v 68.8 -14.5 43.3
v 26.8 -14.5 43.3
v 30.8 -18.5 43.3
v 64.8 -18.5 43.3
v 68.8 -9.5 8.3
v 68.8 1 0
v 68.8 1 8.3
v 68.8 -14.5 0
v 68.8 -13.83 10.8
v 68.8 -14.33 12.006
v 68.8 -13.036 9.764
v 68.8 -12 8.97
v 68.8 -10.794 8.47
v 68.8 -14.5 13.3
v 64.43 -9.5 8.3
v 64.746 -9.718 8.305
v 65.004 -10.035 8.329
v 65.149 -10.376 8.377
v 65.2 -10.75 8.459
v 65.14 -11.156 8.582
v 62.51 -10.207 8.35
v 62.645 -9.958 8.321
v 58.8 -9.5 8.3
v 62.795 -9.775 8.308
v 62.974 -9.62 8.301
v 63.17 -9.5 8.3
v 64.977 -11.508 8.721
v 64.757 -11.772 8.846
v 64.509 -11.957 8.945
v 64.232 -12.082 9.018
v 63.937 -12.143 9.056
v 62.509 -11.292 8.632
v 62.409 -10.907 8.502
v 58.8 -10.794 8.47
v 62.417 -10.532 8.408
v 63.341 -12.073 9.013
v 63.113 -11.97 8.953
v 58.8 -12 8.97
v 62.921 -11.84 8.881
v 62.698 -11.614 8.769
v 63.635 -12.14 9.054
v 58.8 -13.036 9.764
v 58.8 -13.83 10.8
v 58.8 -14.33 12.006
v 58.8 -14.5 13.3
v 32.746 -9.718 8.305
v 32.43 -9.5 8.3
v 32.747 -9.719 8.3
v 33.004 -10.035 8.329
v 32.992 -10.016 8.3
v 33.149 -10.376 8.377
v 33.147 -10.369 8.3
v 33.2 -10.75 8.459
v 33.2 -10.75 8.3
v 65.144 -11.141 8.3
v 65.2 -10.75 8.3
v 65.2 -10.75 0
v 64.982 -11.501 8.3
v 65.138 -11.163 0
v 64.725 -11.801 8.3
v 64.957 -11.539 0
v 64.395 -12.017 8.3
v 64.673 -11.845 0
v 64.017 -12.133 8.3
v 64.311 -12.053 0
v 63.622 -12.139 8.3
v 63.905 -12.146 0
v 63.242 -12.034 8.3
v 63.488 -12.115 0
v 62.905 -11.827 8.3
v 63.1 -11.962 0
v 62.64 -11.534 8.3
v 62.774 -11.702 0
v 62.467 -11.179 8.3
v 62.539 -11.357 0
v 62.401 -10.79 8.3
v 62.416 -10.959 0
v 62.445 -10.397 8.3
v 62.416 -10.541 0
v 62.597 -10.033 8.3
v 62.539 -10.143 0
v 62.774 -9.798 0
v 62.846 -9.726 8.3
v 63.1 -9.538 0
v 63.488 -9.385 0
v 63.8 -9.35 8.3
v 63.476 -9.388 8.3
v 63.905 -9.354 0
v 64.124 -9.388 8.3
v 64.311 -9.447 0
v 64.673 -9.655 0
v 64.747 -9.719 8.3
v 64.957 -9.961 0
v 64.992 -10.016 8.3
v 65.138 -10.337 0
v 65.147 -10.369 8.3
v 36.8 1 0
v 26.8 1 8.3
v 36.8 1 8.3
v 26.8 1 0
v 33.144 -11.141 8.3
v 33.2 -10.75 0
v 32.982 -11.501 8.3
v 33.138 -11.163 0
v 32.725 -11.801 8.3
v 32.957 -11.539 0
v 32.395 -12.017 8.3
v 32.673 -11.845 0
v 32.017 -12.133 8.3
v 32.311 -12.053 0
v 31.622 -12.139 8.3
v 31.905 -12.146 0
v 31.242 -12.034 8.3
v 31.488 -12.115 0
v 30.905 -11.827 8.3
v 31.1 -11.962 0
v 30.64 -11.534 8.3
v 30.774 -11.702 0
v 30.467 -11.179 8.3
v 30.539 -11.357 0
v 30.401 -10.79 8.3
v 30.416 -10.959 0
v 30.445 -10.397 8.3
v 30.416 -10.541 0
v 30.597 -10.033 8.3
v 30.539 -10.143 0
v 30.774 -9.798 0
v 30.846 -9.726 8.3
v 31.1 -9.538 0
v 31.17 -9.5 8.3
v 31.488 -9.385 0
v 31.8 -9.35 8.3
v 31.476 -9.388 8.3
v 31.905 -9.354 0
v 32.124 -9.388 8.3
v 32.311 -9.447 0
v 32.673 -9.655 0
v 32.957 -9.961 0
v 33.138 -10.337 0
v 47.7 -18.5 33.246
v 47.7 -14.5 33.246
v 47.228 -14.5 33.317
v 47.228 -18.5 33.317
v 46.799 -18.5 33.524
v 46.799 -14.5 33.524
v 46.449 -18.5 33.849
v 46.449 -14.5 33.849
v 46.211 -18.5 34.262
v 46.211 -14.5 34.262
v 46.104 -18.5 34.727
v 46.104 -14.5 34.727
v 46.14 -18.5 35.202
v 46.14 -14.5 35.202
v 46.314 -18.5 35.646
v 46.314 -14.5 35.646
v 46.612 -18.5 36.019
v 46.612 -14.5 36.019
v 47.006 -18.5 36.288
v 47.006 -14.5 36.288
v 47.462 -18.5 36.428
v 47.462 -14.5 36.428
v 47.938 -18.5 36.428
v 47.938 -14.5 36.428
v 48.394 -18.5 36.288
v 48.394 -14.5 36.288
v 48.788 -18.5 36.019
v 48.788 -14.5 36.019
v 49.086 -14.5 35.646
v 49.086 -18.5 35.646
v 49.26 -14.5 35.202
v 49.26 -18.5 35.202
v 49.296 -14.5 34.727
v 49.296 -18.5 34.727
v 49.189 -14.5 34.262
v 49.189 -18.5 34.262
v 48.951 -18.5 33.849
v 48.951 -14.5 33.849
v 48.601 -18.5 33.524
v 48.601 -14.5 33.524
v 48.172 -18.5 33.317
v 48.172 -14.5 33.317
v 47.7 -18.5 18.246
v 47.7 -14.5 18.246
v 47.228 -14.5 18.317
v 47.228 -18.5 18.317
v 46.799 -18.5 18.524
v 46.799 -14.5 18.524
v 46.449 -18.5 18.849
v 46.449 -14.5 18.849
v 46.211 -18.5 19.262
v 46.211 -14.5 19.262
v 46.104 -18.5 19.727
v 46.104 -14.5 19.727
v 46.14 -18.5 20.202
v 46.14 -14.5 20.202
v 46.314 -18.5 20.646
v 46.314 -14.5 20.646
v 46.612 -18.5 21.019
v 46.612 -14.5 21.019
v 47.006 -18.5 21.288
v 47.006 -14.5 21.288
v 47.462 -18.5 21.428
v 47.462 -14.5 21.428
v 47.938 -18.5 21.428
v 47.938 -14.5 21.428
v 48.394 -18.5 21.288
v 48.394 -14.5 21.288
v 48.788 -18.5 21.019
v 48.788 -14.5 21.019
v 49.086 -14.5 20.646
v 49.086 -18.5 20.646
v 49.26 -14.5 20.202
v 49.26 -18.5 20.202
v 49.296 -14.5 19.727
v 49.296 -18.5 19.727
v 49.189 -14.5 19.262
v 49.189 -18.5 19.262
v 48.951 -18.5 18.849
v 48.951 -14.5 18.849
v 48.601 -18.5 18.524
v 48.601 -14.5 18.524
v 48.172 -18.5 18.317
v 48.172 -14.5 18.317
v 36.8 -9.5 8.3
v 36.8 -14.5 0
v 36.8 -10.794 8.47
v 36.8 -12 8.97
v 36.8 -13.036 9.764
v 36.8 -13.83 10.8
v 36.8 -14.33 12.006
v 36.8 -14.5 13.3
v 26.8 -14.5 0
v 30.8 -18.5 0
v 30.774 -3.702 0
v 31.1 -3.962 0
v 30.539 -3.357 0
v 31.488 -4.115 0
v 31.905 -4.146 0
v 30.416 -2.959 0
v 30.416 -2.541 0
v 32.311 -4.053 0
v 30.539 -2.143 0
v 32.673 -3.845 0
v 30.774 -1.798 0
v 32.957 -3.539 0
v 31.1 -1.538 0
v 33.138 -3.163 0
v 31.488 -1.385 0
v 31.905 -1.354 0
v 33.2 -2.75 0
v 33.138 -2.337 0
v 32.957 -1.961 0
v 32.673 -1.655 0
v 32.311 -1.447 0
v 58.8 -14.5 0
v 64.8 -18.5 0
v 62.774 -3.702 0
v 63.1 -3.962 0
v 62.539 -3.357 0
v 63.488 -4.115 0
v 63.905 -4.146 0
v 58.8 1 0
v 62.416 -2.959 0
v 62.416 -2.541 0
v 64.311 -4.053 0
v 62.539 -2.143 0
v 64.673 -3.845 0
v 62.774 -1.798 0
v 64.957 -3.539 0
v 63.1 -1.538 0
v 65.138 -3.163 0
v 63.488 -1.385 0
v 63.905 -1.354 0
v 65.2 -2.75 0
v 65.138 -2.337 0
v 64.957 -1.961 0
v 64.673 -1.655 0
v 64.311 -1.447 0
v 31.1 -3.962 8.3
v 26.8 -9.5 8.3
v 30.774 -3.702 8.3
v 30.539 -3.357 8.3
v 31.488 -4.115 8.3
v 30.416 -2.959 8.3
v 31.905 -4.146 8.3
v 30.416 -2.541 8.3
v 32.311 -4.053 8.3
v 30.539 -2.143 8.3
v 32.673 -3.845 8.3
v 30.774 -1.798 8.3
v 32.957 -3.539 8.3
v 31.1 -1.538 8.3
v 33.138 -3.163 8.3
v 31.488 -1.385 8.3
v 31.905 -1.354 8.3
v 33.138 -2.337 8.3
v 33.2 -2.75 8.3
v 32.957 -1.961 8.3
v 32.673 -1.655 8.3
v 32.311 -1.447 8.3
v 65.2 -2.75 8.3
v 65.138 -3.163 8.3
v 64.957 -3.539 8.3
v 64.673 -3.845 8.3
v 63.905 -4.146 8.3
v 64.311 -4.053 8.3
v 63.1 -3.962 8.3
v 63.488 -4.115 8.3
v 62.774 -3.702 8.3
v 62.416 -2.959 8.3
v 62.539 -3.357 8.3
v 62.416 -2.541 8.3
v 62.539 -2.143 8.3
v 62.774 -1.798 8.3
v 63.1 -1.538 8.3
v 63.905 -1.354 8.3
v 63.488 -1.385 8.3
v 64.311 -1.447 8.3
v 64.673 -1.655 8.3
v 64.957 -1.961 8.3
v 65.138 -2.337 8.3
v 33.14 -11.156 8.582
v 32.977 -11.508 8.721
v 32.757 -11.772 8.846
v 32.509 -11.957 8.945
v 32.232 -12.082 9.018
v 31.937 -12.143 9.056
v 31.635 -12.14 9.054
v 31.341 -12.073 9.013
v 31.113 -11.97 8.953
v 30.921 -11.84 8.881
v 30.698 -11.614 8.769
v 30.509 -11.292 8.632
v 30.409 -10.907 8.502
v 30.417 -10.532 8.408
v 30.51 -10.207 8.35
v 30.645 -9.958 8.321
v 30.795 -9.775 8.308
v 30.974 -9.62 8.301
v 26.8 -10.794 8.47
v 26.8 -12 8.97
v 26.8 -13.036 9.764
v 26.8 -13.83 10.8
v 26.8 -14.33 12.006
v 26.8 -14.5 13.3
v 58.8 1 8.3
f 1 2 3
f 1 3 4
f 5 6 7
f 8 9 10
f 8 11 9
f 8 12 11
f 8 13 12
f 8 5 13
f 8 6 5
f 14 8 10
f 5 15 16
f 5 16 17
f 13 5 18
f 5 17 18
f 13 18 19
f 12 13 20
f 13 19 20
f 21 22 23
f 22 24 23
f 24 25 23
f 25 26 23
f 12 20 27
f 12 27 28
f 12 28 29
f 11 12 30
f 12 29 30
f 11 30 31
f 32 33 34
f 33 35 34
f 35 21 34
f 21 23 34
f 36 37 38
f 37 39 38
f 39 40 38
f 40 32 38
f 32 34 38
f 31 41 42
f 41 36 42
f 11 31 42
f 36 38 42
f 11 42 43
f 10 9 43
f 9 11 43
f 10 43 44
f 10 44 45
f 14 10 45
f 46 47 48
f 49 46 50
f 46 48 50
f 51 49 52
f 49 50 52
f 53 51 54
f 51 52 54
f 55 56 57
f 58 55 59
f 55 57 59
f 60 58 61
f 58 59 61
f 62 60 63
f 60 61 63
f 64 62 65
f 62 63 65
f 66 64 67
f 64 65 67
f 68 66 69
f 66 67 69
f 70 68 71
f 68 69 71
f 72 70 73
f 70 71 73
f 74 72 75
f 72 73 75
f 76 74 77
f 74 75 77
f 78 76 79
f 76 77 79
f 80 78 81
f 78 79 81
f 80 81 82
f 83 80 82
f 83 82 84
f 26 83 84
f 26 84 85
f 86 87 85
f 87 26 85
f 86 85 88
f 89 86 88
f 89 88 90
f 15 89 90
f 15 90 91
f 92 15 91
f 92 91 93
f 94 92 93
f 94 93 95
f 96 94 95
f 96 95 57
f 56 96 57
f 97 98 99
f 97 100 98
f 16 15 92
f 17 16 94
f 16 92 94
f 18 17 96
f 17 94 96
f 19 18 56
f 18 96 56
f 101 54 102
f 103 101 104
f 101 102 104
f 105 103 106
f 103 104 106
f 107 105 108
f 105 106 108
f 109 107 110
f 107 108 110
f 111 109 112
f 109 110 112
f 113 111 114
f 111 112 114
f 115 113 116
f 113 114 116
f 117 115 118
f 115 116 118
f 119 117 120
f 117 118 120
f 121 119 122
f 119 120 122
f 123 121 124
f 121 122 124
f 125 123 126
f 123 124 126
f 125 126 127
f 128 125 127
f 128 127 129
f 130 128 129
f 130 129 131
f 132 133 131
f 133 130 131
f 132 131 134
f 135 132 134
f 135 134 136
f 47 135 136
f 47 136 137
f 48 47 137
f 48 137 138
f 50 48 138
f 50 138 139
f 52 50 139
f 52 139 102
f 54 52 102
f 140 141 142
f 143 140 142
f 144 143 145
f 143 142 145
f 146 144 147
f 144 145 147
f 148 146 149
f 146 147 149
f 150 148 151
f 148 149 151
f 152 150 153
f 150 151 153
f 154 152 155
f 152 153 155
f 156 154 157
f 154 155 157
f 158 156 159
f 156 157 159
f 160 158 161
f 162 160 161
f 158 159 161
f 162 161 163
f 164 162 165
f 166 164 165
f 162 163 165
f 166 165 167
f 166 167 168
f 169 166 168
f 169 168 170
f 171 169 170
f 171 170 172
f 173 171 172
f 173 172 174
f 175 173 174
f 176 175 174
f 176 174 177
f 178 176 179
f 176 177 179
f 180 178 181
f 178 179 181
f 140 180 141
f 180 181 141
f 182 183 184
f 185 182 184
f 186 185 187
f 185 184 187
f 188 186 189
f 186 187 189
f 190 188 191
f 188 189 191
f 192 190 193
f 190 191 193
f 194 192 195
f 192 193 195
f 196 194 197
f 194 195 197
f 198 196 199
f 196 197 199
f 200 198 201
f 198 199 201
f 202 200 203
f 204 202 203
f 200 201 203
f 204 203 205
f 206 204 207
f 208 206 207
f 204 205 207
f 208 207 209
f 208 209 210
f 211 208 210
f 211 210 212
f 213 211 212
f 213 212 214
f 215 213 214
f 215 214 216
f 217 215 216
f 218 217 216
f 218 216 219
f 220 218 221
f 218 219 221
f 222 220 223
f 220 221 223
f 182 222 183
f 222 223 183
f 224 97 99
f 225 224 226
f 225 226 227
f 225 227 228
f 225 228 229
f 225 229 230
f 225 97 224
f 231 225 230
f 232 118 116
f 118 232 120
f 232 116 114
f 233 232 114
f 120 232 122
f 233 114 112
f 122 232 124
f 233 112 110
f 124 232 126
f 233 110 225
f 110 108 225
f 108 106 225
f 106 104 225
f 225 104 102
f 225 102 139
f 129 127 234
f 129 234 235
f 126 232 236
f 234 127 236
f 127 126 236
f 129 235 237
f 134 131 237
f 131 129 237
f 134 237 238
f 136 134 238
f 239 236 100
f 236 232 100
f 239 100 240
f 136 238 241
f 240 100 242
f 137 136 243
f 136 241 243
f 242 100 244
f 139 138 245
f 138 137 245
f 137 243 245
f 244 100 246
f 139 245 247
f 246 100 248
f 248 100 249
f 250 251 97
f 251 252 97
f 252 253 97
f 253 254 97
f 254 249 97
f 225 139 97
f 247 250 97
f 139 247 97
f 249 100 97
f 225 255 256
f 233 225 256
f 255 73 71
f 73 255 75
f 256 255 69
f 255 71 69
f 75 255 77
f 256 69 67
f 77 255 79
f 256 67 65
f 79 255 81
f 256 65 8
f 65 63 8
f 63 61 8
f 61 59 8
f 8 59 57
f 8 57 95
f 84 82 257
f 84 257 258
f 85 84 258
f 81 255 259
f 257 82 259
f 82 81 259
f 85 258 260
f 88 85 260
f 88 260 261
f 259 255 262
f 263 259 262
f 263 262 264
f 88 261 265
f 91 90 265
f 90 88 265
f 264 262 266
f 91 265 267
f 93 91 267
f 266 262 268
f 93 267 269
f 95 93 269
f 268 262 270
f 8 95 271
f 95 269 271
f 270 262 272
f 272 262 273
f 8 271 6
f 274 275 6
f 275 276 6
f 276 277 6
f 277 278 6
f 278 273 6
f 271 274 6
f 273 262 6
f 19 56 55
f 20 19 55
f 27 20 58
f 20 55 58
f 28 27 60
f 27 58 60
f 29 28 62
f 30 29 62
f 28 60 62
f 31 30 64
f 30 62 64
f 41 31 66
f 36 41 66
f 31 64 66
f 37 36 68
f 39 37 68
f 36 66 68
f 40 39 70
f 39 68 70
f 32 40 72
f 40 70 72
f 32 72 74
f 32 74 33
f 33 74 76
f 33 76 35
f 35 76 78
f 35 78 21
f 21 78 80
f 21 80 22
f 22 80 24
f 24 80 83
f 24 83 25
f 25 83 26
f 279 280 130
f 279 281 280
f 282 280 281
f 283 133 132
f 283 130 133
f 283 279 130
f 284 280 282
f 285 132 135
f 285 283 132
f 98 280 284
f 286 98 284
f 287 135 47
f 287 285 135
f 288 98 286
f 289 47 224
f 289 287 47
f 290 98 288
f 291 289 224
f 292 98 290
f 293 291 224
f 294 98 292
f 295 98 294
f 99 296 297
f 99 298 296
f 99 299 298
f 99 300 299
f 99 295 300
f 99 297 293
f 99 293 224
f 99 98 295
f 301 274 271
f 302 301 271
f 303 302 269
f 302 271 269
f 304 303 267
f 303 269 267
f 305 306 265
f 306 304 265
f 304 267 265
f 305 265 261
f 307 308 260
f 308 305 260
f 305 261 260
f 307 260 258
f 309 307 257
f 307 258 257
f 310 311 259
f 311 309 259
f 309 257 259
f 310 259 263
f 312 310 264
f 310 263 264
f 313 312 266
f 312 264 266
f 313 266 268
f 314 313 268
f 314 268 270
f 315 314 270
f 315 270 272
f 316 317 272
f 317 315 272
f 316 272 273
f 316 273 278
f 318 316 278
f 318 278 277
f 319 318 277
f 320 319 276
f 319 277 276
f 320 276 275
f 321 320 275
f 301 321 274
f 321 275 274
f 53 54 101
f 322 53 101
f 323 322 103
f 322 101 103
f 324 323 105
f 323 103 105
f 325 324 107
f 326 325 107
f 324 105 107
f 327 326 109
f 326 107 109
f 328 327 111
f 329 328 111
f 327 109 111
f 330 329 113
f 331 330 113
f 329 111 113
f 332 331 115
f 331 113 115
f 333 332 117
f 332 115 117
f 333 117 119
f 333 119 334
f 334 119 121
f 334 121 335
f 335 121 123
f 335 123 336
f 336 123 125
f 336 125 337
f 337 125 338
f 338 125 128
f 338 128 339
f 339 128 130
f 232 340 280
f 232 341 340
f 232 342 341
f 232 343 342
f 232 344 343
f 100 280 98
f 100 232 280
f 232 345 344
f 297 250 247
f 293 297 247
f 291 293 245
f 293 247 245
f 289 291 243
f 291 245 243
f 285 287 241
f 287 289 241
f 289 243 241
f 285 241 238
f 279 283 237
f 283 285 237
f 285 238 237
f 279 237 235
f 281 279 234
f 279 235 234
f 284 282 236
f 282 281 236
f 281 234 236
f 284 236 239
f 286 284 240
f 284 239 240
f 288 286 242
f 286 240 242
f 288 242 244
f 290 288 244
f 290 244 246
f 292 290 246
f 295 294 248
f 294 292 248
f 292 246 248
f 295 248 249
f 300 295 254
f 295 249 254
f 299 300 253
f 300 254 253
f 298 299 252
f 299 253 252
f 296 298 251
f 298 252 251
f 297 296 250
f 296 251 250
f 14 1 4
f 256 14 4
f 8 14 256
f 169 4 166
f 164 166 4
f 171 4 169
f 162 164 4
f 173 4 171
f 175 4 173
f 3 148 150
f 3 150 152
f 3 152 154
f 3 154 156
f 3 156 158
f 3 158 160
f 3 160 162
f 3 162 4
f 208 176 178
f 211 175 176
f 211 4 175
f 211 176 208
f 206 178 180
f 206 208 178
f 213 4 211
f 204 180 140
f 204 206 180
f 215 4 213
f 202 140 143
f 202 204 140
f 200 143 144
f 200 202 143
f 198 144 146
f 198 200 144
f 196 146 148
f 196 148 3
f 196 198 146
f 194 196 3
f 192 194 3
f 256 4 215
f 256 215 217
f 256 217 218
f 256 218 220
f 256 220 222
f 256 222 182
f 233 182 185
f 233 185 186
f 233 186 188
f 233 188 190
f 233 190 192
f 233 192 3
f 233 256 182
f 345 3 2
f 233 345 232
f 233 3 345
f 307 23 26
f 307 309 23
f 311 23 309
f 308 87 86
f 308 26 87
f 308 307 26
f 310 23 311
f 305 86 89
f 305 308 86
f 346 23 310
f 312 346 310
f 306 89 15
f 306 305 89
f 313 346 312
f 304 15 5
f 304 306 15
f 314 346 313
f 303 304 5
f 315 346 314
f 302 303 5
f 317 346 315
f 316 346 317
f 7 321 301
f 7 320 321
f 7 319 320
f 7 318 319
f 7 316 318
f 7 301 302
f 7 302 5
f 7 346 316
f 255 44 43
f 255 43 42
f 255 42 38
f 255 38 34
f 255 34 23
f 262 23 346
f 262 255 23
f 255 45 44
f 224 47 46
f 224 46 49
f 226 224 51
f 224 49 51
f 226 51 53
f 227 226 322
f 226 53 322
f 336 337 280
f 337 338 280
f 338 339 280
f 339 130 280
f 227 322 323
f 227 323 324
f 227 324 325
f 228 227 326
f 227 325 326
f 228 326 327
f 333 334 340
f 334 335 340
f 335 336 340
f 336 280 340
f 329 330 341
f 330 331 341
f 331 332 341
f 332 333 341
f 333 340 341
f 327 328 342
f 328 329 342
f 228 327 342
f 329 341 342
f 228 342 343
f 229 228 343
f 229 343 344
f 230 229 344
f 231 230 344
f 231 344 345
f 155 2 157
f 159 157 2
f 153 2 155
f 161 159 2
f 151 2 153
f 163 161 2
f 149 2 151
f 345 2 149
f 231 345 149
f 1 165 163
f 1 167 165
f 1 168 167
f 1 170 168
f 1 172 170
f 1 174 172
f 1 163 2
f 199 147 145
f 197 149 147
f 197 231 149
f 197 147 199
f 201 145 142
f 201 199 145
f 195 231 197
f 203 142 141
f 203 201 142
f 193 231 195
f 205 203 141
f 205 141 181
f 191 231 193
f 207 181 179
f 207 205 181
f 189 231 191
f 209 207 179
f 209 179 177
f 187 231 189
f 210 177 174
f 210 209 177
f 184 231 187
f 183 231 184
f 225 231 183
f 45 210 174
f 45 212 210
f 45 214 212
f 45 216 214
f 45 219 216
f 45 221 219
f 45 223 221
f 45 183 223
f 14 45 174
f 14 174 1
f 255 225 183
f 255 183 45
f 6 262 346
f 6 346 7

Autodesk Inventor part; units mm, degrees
ref_plane "YZ Plane" through (0, 0, 0) normal (1, 0, 0) x (0, 1, 0)
ref_plane "XZ Plane" through (0, 0, 0) normal (0, 1, 0) x (-1, 0, 0)
ref_plane "Work Plane1" through (0, 0, 0) normal (0, 0, 1) x (1, 0, 0)
ref_plane "Work Plane2" through (40.2, -14.35, 43.3) normal (0, 0, 1) x (1, 0, 0)
sketch "Sketch1" plane through (0, 0, 0) normal (0, 0, 1) x (1, 0, 0)
  circle A0 centre (31.8, -10.75) radius 1.4 projected
  circle A1 centre (63.8, -10.75) radius 1.4 projected
  circle A2 centre (63.8, -2.75) radius 1.4 projected
  circle A3 centre (31.8, -2.75) radius 1.4 projected
  circle A4 centre (47.8, -6.75) radius 3.0846 projected
  line L0 (21, -14.5) -> (21, 1) projected
  line L1 (21, -14.5) -> (74.6, -14.5) projected
  line L2 (74.6, 1) -> (74.6, -14.5) projected
  line L3 (21, 1) -> (74.6, 1) projected
  circle A5 centre (47.8, -6.75) radius 2.196 construction
  line L4 (55.4, 0.85) -> (40.2, 0.85) construction
  line L5 (40.2, 0.85) -> (40.2, -14.35) construction
  line L6 (40.2, -14.35) -> (55.4, -14.35) construction
  line L7 (55.4, -14.35) -> (55.4, 0.85) construction
  line L8 (68.8, -14.5) -> (58.8, -14.5)
  line L9 (58.8, -14.5) -> (58.8, 1)
  line L10 (58.8, 1) -> (68.8, 1)
  line L11 (68.8, 1) -> (68.8, -14.5)
  line L12 (68.8, -14.5) -> (58.8, 1) construction
  line L13 (58.8, -14.5) -> (68.8, 1) construction
  line L14 (36.8, -14.5) -> (26.8, -14.5)
  line L15 (26.8, -14.5) -> (26.8, 1)
  line L16 (26.8, 1) -> (36.8, 1)
  line L17 (36.8, 1) -> (36.8, -14.5)
  line L18 (36.8, -14.5) -> (26.8, 1) construction
  line L19 (26.8, -14.5) -> (36.8, 1) construction
  line L20 (26.8, -14.5) -> (68.8, -14.5)
  line L21 (68.8, -14.5) -> (68.8, -18.5)
  line L22 (68.8, -18.5) -> (26.8, -18.5)
  line L23 (26.8, -18.5) -> (26.8, -14.5)
  point P0 (0, 0)
  point P1 (63.8, -6.75)
  point P2 (31.8, -6.75)
  dimension "d0" = 10
  dimension "d1" = 15.5
  dimension "d2" = 0
  dimension "d3" = 10
  dimension "d4" = 15.5
  dimension "d7" = 4
extrude "Extrusion1" add sketch "Sketch1" along normal up to surface (43.3 mm away) contours L15 L3 L17 L1 | L1 L21 L22 L23 | L9 L3 L11 L1
sketch "Sketch2" plane through (26.8, -18.5, 0) normal (0, -1, 0) x (1, 0, 0)
  circle A0 centre (20.9, 34.8462) radius 1 projected
  circle A1 centre (20.9, 19.8462) radius 1 projected
  line L0 (13.4, 13) -> (28.6, 13) projected
  line L1 (28.6, 13) -> (28.6, 43.3) projected
  line L2 (13.4, 43.3) -> (28.6, 43.3) projected
  line L3 (13.4, 13) -> (13.4, 43.3) projected
  point P0 (-26.8, 0)
hole "Hole1" at (47.7, -18.5, 19.8462) at (47.7, -18.5, 34.8462) direction (0, 1, 0) diameter 3.2 end through all
chamfer "Chamfer1" distance 4 angle 45 2 edges at (26.8, -18.5, 21.65) (68.8, -18.5, 21.65)
sketch "Sketch3" plane through (36.8, -14.5, 43.3) normal (0, 0, 1) x (1, 0, 0)
  line L0 (32, 0) -> (28, -4) projected
  line L1 (32, 15.5) -> (32, 0) projected
  line L2 (22, 15.5) -> (32, 15.5) projected
  line L3 (22, 0) -> (22, 15.5) projected
  line L4 (0, 0) -> (22, 0) projected
  line L5 (0, 15.5) -> (0, 0) projected
  line L6 (-10, 15.5) -> (0, 15.5) projected
  line L7 (-10, 0) -> (-10, 15.5) projected
  line L8 (-6, -4) -> (-10, 0) projected
  line L9 (28, -4) -> (-6, -4) projected
  circle A0 centre (27, 3.75) radius 1.4 projected
  circle A1 centre (27, 11.75) radius 1.4 projected
  circle A2 centre (-5, 3.75) radius 1.4 projected
  circle A3 centre (-5, 11.75) radius 1.4 projected
  line L10 (-10, 0) -> (32, 0)
  point P0 (-36.8, 14.5)
extrude "Extrusion2" cut sketch "Sketch3" against normal blind 35 contours L10 L3 L2 L1 | L10 L7 L6 L5
fillet "Fillet1" radius 5 2 edges at (63.8, -14.5, 8.3) (31.8, -14.5, 8.3)
properties part number "31_MTP_wellplate_Solenoid_adapter"
